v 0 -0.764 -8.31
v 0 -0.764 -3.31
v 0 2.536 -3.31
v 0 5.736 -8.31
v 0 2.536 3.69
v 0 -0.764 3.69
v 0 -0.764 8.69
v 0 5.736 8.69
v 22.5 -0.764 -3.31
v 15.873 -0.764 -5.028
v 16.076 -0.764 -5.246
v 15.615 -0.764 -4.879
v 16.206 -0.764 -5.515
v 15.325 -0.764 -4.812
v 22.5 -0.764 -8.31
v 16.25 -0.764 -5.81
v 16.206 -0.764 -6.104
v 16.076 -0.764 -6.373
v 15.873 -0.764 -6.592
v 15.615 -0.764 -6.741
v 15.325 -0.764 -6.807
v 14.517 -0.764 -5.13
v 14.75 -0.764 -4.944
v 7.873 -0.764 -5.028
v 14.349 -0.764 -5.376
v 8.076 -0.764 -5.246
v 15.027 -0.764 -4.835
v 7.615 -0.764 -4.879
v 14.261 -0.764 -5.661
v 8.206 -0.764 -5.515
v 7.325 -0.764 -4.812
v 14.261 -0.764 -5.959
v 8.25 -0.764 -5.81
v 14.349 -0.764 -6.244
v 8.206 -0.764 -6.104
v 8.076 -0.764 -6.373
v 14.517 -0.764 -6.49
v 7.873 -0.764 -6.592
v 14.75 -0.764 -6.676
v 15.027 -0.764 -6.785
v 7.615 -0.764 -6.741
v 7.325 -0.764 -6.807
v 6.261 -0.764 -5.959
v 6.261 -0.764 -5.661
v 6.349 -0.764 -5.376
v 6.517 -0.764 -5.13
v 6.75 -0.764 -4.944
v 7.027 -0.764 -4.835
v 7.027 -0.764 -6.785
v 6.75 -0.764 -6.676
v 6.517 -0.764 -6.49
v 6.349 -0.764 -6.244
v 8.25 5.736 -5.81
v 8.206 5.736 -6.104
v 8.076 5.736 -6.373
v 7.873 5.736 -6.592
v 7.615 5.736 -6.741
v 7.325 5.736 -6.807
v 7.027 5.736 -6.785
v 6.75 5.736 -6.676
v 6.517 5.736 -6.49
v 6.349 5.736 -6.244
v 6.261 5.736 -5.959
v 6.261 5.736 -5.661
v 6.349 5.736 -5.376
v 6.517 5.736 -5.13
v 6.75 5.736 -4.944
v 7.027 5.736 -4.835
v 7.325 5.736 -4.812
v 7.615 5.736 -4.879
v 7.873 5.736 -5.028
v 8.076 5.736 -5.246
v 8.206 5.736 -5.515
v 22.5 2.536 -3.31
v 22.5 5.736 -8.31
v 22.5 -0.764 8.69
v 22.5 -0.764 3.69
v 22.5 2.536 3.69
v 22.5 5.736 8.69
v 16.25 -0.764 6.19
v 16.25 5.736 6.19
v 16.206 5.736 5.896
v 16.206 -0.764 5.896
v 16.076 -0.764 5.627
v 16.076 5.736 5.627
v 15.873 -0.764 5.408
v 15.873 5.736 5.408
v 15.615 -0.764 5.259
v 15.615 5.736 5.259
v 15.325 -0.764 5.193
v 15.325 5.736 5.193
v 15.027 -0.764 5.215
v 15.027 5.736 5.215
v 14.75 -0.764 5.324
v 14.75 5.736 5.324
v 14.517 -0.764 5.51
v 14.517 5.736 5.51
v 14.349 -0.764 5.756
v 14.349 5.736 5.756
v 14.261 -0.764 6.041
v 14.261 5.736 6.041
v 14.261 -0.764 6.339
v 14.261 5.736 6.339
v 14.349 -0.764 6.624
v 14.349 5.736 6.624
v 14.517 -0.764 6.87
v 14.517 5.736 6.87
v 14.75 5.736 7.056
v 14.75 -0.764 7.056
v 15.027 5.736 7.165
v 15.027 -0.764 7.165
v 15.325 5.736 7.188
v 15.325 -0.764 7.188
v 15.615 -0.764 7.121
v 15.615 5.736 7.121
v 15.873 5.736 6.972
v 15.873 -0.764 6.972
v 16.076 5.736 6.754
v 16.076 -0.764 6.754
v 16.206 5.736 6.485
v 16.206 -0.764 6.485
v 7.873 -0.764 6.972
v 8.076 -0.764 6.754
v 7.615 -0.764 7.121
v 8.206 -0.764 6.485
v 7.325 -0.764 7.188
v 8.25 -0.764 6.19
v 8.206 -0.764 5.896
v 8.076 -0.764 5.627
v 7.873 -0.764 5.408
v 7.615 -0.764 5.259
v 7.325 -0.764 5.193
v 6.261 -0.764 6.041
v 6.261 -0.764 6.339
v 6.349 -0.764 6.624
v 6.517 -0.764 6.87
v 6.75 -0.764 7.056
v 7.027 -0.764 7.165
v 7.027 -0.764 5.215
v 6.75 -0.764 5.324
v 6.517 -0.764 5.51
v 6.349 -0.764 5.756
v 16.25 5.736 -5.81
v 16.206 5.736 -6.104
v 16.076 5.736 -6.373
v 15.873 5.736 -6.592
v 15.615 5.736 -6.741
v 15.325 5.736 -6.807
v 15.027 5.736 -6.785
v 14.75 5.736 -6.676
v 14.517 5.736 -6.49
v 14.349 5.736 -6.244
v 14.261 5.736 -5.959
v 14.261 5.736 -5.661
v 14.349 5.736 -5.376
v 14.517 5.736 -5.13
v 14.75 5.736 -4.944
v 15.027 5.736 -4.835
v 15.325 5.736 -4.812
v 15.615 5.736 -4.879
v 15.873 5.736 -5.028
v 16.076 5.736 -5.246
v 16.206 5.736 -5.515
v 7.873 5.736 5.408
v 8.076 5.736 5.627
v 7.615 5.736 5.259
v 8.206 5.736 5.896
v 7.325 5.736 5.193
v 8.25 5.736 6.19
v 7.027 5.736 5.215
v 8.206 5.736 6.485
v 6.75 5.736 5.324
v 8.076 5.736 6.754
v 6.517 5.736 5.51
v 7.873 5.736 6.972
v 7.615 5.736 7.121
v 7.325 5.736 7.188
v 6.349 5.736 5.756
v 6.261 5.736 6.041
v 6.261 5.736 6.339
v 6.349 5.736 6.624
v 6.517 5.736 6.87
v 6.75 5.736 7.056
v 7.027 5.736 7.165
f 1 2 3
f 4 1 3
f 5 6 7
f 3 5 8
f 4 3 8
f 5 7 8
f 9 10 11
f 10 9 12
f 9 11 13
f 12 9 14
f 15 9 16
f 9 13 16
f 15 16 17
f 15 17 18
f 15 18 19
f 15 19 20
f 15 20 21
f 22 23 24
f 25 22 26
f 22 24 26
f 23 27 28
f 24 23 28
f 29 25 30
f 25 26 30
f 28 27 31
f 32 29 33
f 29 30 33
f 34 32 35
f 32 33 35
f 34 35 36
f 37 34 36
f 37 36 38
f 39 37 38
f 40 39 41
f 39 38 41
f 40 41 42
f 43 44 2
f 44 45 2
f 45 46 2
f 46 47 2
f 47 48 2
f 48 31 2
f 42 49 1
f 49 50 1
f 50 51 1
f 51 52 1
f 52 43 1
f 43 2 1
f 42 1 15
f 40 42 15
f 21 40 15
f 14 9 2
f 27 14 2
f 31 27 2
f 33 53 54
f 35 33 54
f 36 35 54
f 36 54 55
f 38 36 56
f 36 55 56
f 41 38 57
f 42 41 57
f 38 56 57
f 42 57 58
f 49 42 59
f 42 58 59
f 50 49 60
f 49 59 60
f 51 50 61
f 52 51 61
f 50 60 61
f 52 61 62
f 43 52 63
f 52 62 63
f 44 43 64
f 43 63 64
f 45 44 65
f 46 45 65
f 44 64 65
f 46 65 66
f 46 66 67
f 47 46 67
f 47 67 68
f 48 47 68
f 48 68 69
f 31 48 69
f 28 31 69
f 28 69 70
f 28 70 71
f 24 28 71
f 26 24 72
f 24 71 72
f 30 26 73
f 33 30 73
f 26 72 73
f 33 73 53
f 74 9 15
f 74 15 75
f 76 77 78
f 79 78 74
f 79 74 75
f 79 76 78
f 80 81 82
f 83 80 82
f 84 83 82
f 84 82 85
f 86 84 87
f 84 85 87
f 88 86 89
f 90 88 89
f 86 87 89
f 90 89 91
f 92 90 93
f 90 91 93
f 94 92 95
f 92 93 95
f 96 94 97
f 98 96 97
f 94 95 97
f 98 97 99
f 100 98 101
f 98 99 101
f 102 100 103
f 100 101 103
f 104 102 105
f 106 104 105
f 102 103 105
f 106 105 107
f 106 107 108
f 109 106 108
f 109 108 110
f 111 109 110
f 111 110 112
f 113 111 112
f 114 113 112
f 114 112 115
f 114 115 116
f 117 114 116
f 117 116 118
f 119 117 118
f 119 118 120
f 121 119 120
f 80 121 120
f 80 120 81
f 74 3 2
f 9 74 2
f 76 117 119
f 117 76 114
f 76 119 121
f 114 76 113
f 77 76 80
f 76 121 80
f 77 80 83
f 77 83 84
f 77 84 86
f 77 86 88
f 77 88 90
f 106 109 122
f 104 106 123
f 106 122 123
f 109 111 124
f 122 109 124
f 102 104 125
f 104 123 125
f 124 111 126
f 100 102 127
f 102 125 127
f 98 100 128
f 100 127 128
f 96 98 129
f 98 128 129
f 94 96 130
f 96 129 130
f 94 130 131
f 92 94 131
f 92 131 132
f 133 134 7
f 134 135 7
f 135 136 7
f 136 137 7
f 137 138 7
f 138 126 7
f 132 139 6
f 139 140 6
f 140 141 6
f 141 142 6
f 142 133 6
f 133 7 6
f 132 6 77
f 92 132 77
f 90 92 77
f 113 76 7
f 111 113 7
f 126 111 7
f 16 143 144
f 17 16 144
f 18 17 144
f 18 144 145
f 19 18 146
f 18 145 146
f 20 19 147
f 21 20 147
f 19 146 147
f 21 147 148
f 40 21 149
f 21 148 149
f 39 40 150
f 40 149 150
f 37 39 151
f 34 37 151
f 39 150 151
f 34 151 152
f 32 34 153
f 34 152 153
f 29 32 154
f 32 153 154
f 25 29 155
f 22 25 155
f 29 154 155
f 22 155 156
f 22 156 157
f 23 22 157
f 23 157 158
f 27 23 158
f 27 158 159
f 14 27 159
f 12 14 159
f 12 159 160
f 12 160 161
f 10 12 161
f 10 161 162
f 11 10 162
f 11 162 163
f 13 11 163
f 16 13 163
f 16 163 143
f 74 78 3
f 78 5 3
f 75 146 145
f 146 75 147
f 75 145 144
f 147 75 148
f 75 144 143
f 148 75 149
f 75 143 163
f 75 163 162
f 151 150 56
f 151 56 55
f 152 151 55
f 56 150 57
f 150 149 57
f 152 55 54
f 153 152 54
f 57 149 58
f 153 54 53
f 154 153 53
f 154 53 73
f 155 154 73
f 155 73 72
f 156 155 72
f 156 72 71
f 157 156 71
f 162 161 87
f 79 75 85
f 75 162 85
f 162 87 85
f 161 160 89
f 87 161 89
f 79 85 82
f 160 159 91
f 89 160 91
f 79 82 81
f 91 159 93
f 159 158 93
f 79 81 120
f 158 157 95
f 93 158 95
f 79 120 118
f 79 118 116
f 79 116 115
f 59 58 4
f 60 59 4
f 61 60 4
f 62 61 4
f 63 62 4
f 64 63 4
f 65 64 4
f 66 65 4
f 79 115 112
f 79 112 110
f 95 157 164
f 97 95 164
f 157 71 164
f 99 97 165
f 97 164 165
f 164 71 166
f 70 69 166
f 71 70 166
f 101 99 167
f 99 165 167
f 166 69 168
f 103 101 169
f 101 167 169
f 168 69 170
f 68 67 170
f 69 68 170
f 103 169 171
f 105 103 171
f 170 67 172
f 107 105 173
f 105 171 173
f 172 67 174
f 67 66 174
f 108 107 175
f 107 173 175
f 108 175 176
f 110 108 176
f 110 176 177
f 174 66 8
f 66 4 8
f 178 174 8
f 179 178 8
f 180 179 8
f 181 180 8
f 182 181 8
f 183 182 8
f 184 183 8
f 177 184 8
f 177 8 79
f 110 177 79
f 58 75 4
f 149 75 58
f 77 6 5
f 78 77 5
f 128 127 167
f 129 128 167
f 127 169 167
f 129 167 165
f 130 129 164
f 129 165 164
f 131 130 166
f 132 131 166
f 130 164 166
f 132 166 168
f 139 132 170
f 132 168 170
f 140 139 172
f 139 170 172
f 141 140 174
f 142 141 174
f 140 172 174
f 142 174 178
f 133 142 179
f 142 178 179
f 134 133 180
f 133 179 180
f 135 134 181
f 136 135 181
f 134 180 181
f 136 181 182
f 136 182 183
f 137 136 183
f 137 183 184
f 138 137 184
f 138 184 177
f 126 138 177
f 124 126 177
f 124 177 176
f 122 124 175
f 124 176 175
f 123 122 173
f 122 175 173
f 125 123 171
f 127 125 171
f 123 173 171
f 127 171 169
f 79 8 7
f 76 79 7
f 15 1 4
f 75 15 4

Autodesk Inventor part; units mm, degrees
ref_plane "YZ Plane" through (0, 0, 0) normal (1, 0, 0) x (0, 1, 0)
ref_plane "XZ Plane" through (0, 0, 0) normal (0, 1, 0) x (-1, 0, 0)
ref_plane "XY Plane" through (0, 0, 0) normal (0, 0, 1) x (1, 0, 0)
sketch "Sketch1" plane through (0, 0, 0) normal (1, 0, 0) x (0, 1, 0)
  line L0 (5.7363, 8.6903) -> (-0.7637, 8.6903)
  line L1 (-0.7637, 8.6903) -> (-0.7637, 3.6903)
  line L2 (-0.7637, 3.6903) -> (2.5363, 3.6903)
  line L3 (2.5363, 3.6903) -> (2.5363, -3.3097)
  line L4 (2.5363, -3.3097) -> (-0.7637, -3.3097)
  line L5 (-0.7637, -3.3097) -> (-0.7637, -8.3097)
  line L6 (-0.7637, -8.3097) -> (5.7363, -8.3097)
  line L7 (5.7363, -8.3097) -> (5.7363, 8.6903)
  point P0 (0, 0)
  dimension "d0" = 17
  dimension "d1" = 3.3
  dimension "d2" = 6.5
  dimension "d3" = 5
  dimension "d4" = 7
extrude "Extrusion1" add sketch "Sketch1" along normal blind 22.5
sketch "Sketch2" plane through (0, 5.7363, 8.6903) normal (0, 1, 0) x (1, 0, 0)
  circle A0 centre (7.25, 2.5) radius 1
  circle A1 centre (15.25, 2.5) radius 1
  circle A2 centre (15.25, 14.5) radius 1
  circle A3 centre (7.25, 14.5) radius 1
  line L0 (0, 0) -> (22.5, 0) projected
  line L1 (22.5, 17) -> (22.5, 0) projected
  line L2 (0, 17) -> (0, 0) projected
  point P0 (0, 8.6903)
  dimension "d7" = 8
  dimension "d8" = 2
  dimension "d10" = 2
  dimension "d12" = 2
  dimension "d13" = 2
  dimension "d14" = 12
  dimension "d15" = 12
  dimension "d16" = 2.5
  dimension "d17" = 7.25
  dimension "d18" = 7.25
  dimension "d20" = 8
  dimension "d21" = 2.5
extrude "Extrusion2" cut sketch "Sketch2" against normal through all
properties part number "MGN7C_slider" material "ABS Plastic"
